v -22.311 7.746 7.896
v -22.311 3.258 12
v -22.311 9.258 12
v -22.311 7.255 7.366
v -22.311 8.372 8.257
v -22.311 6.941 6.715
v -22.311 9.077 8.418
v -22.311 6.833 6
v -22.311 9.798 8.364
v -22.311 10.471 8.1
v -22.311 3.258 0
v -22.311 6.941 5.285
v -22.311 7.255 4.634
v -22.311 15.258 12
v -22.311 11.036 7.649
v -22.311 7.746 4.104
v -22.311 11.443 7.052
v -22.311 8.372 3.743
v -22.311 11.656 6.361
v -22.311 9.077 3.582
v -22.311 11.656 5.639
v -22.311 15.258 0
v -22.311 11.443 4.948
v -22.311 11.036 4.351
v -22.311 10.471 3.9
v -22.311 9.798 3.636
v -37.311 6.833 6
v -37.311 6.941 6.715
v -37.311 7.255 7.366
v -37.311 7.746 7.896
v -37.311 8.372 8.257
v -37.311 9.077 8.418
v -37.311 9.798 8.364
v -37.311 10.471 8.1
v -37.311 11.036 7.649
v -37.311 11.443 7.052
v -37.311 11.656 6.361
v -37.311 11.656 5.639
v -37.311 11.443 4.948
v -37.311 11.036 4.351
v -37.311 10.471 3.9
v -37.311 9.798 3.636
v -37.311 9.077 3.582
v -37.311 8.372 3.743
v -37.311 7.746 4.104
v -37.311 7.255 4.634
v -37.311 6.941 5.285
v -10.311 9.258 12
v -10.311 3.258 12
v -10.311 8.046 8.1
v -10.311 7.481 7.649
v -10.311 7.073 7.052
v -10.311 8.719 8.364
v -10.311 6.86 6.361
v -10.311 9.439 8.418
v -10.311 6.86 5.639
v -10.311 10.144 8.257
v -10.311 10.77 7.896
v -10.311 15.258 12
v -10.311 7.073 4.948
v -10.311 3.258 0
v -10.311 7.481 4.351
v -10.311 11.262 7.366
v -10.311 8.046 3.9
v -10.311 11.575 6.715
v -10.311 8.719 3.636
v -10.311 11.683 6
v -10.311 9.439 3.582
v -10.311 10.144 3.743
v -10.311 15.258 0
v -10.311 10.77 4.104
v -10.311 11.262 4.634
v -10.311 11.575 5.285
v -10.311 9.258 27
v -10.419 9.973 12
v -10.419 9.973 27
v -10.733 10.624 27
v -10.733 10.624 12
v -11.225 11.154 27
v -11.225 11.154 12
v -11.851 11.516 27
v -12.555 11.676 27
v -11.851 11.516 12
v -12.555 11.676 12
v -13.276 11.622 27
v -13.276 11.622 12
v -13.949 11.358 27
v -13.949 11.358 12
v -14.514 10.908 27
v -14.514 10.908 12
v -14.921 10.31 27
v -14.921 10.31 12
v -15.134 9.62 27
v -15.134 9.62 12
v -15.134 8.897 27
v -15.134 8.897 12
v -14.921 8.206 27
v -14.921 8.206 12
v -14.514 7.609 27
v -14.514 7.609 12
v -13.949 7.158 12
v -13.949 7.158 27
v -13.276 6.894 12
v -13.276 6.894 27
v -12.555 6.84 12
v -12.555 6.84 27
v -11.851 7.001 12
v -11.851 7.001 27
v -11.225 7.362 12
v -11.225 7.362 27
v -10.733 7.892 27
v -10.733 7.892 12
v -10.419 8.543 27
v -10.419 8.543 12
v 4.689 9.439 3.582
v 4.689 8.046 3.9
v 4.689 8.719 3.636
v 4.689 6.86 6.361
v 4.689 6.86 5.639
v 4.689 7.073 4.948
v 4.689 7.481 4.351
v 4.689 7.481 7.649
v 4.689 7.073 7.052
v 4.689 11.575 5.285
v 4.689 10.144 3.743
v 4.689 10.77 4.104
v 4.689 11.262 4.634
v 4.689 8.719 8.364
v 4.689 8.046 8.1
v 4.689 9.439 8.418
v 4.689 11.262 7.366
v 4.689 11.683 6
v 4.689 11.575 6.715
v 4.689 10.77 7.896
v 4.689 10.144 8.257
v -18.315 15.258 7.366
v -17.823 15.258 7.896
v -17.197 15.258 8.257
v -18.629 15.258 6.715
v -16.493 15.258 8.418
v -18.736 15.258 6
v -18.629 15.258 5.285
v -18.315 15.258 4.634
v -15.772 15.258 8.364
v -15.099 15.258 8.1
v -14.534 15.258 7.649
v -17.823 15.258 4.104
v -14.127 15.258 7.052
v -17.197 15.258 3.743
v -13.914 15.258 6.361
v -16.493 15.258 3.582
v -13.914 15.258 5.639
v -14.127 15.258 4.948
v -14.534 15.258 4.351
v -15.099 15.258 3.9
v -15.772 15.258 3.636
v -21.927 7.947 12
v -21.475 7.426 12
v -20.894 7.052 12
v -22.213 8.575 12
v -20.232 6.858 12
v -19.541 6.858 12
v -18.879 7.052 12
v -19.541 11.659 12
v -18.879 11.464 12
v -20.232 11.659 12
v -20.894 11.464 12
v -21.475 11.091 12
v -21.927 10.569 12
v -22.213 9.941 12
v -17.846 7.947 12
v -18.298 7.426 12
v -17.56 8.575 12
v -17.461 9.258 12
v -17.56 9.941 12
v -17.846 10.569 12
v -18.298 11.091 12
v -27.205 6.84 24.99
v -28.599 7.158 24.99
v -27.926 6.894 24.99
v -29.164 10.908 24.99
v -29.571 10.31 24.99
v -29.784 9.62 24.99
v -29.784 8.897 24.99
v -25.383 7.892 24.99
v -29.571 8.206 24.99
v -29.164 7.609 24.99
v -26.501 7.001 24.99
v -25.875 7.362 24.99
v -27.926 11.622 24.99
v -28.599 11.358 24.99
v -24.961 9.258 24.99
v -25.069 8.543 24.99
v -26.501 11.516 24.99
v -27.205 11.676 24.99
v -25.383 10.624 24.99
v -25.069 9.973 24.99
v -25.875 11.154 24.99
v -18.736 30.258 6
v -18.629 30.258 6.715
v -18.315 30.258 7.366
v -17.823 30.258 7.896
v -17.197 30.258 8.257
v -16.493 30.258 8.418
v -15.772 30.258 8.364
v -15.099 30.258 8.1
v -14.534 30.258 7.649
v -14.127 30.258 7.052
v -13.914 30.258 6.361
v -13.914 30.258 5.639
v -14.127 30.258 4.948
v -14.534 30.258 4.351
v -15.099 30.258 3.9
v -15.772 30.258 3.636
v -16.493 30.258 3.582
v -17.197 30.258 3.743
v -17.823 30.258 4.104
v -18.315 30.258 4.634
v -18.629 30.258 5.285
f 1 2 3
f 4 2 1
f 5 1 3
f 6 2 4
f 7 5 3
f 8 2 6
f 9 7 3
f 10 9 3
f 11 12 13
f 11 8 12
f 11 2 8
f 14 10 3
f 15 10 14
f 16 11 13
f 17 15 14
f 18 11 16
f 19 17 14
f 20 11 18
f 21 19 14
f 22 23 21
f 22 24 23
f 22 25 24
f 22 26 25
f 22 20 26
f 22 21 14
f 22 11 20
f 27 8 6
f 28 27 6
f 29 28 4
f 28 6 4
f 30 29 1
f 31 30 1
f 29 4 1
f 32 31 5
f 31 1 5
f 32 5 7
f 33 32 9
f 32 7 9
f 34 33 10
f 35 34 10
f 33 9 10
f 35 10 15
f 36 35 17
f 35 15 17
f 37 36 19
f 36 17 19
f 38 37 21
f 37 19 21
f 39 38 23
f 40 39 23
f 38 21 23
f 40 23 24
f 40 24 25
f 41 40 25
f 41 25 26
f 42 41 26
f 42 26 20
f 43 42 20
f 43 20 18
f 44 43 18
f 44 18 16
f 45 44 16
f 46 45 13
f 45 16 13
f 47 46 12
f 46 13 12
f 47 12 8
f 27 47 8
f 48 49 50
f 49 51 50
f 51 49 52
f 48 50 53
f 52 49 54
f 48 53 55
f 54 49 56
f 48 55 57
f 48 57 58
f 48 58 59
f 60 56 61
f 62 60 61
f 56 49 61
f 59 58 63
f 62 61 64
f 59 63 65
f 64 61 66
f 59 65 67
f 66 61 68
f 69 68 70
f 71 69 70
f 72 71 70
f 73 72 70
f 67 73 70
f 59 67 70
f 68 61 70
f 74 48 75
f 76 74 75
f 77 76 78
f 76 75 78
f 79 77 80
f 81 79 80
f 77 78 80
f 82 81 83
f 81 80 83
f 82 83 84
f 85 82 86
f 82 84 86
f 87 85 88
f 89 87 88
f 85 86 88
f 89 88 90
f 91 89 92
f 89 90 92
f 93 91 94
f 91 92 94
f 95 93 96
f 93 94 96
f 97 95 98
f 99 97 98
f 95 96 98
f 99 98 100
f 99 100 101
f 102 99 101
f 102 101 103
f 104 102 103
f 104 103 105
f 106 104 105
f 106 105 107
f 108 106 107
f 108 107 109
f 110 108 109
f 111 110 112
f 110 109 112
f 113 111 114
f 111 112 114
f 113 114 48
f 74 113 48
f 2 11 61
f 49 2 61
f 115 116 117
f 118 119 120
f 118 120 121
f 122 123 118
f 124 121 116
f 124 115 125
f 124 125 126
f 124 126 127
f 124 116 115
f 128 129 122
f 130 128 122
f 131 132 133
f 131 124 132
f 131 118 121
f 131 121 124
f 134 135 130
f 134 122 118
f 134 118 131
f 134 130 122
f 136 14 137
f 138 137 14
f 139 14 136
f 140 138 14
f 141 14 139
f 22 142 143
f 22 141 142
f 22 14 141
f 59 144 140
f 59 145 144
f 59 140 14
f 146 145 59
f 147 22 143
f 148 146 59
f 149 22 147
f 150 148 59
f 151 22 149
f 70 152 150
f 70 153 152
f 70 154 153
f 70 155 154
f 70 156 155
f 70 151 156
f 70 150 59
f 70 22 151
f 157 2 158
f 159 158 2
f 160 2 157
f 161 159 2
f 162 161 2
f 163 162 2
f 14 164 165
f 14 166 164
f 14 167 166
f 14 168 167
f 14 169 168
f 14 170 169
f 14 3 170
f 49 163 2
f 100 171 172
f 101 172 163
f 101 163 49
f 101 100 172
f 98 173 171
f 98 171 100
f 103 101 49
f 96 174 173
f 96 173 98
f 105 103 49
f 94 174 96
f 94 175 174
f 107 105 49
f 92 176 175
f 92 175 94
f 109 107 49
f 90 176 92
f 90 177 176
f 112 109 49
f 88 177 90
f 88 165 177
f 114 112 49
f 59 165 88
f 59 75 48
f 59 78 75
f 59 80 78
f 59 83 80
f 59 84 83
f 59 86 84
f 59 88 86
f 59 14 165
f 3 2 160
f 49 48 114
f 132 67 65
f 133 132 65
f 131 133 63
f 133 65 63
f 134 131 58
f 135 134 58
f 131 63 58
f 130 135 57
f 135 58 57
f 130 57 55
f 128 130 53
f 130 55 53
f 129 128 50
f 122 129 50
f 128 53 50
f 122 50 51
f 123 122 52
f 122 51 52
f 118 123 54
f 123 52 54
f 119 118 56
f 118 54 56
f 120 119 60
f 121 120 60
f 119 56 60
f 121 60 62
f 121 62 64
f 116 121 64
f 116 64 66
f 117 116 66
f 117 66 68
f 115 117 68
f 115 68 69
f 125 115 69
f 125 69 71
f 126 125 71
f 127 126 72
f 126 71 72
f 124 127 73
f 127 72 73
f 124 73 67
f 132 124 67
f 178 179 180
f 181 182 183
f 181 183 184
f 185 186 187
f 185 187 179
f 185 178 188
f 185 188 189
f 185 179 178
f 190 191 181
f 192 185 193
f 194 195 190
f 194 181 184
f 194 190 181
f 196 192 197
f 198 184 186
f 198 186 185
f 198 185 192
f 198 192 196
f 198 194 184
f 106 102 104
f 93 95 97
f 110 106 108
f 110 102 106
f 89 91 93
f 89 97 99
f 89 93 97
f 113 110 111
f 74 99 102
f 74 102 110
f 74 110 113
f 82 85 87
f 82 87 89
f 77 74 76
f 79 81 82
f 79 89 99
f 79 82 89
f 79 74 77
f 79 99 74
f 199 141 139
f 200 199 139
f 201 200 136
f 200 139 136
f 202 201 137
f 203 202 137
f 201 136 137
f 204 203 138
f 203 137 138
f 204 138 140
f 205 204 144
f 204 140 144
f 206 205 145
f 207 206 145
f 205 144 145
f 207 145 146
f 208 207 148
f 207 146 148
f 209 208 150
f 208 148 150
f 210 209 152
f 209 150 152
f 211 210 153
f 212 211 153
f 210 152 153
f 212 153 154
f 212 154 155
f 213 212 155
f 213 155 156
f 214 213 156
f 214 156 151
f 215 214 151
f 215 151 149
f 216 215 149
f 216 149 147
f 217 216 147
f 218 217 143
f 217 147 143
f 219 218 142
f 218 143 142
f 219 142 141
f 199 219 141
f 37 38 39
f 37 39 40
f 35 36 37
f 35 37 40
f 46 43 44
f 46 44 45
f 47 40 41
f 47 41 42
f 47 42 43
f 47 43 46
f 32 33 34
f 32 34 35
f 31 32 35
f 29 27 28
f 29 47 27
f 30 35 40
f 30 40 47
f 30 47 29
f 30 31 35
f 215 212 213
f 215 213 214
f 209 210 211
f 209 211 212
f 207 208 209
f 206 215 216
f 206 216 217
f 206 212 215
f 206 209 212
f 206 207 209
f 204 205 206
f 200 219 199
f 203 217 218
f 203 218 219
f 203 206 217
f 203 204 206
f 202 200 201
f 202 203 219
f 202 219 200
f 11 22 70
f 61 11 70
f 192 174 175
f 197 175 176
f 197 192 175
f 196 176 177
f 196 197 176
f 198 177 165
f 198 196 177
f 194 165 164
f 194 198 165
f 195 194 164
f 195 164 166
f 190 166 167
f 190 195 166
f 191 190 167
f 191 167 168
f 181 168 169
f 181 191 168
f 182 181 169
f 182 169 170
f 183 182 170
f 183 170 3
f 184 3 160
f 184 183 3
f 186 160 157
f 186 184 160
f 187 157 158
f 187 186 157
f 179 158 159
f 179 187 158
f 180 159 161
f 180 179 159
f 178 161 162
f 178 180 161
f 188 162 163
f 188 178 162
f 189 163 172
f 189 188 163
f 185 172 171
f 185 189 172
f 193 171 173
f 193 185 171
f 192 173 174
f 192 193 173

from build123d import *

# Parameters (mm, degrees)
F0_W      = 12
F0_H      = 12
F1_DEPTH  = 12
F2_R      = 2.425
F3_DEPTH  = 15
F4_R      = 2.425
F5_DEPTH  = 15
F6_R      = 2.425
F9_DEPTH  = 15
F10_R     = 2.425
F11_DEPTH = 15


with BuildPart() as f1:
    # F0 (on Top) → F1 (new body)
    with BuildSketch(Plane.XY):
        with Locations((-16.311498, 9.258204)):
            Rectangle(F0_W, F0_H)
    extrude(amount=F1_DEPTH)

    # F2 (on face) → F3 (join)
    with BuildSketch(Plane.YZ.offset(-10.311498)):
        with Locations((9.258204, 6)):
            Circle(F2_R)
    extrude(amount=F3_DEPTH)

    # F4 (on face) → F5 (join)
    with BuildSketch(Plane(origin=(-22.311498, 0, 0), x_dir=(0, -1, 0), z_dir=(-1, 0, 0))):
        with Locations((-9.258204, 6)):
            Circle(F4_R)
    extrude(amount=F5_DEPTH)

    # F8: sweep along a path in F7
    with BuildLine(Plane(origin=(0, 15.258204, 0), x_dir=(-1, 0, 0), z_dir=(0, 1, 0))) as f8_path:
        Line((19.886498, 12), (27.386498, 24.990381))
    # F6 (on face) → F8 (sweep)
    with BuildSketch(Plane.XY.offset(12)):
        with BuildLine():
            ThreePointArc((-22.311498, 9.258204), (-19.886498, 6.833204), (-17.461498, 9.258204))
            ThreePointArc((-17.461498, 9.258204), (-19.886498, 11.683204), (-22.311498, 9.258204))
        make_face()
    sweep(path=f8_path.line)

    # F6 (on face) → F9 (join)
    with BuildSketch(Plane.XY.offset(12)):
        with Locations((-12.736498, 9.258204)):
            Circle(F6_R)
    extrude(amount=F9_DEPTH)

    # F10 (on face) → F11 (join)
    with BuildSketch(Plane(origin=(0, 15.258204, 0), x_dir=(-1, 0, 0), z_dir=(0, 1, 0))):
        with Locations((16.311498, 6)):
            Circle(F10_R)
    extrude(amount=F11_DEPTH)


solid = f1.part
